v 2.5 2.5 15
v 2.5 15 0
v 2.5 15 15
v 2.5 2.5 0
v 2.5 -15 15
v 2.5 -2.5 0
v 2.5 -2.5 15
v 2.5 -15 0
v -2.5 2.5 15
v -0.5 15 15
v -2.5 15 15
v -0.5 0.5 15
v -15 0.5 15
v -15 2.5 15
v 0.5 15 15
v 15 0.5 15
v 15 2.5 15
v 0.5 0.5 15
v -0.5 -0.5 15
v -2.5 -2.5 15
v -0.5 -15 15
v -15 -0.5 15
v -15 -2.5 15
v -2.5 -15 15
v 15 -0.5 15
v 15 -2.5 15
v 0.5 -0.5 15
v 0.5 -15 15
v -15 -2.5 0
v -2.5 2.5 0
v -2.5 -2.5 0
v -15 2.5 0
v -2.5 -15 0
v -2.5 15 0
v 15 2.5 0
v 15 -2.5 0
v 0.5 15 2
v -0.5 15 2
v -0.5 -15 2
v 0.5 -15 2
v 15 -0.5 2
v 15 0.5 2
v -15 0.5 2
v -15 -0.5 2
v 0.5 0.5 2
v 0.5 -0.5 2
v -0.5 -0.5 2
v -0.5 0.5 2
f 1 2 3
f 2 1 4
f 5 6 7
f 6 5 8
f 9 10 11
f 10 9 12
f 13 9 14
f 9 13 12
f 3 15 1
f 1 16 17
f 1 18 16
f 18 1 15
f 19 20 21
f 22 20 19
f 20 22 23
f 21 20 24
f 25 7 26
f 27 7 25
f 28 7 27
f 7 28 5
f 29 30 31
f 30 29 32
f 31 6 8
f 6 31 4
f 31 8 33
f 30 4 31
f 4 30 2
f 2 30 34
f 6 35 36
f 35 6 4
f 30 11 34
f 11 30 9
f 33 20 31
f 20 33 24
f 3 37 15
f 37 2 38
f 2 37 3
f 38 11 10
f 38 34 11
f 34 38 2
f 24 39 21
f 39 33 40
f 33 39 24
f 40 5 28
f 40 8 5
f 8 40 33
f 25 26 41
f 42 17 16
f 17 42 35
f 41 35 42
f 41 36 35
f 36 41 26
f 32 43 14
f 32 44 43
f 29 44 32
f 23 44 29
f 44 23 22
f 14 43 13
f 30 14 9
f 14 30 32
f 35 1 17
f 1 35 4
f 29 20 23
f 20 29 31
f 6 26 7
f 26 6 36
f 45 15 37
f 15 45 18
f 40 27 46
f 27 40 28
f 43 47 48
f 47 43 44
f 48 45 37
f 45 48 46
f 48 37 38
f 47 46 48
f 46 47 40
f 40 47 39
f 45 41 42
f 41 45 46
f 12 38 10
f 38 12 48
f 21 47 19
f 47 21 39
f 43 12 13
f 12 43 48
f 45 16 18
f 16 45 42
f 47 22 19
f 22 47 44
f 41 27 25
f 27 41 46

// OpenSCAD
// configurable stuff

divider_thickness = 1; 			// [0.1:0.1:100]
support_wall_thickness = 2;		// [0.1:0.1:100]
support_height = 15;			// [0.1:0.1:100]
support_width = 30;				// [0.1:0.1:100]

/* [Hidden] */

support_length = support_width;
total_thickness = divider_thickness + (2 * support_wall_thickness);


module makebox ( xbox, ybox, zbox ) {

    translate([-(xbox/2), -(ybox/2), 0]) 
    cube([xbox, ybox, zbox]);

}

difference() {

union() {
    makebox(total_thickness, support_width, support_height);
    makebox(support_length, total_thickness, support_height);
    
}

translate([0,0,support_wall_thickness]) makebox(divider_thickness,support_width+1, support_height);    
translate([0,0,support_wall_thickness]) makebox(support_length+1, divider_thickness, support_height);

}
